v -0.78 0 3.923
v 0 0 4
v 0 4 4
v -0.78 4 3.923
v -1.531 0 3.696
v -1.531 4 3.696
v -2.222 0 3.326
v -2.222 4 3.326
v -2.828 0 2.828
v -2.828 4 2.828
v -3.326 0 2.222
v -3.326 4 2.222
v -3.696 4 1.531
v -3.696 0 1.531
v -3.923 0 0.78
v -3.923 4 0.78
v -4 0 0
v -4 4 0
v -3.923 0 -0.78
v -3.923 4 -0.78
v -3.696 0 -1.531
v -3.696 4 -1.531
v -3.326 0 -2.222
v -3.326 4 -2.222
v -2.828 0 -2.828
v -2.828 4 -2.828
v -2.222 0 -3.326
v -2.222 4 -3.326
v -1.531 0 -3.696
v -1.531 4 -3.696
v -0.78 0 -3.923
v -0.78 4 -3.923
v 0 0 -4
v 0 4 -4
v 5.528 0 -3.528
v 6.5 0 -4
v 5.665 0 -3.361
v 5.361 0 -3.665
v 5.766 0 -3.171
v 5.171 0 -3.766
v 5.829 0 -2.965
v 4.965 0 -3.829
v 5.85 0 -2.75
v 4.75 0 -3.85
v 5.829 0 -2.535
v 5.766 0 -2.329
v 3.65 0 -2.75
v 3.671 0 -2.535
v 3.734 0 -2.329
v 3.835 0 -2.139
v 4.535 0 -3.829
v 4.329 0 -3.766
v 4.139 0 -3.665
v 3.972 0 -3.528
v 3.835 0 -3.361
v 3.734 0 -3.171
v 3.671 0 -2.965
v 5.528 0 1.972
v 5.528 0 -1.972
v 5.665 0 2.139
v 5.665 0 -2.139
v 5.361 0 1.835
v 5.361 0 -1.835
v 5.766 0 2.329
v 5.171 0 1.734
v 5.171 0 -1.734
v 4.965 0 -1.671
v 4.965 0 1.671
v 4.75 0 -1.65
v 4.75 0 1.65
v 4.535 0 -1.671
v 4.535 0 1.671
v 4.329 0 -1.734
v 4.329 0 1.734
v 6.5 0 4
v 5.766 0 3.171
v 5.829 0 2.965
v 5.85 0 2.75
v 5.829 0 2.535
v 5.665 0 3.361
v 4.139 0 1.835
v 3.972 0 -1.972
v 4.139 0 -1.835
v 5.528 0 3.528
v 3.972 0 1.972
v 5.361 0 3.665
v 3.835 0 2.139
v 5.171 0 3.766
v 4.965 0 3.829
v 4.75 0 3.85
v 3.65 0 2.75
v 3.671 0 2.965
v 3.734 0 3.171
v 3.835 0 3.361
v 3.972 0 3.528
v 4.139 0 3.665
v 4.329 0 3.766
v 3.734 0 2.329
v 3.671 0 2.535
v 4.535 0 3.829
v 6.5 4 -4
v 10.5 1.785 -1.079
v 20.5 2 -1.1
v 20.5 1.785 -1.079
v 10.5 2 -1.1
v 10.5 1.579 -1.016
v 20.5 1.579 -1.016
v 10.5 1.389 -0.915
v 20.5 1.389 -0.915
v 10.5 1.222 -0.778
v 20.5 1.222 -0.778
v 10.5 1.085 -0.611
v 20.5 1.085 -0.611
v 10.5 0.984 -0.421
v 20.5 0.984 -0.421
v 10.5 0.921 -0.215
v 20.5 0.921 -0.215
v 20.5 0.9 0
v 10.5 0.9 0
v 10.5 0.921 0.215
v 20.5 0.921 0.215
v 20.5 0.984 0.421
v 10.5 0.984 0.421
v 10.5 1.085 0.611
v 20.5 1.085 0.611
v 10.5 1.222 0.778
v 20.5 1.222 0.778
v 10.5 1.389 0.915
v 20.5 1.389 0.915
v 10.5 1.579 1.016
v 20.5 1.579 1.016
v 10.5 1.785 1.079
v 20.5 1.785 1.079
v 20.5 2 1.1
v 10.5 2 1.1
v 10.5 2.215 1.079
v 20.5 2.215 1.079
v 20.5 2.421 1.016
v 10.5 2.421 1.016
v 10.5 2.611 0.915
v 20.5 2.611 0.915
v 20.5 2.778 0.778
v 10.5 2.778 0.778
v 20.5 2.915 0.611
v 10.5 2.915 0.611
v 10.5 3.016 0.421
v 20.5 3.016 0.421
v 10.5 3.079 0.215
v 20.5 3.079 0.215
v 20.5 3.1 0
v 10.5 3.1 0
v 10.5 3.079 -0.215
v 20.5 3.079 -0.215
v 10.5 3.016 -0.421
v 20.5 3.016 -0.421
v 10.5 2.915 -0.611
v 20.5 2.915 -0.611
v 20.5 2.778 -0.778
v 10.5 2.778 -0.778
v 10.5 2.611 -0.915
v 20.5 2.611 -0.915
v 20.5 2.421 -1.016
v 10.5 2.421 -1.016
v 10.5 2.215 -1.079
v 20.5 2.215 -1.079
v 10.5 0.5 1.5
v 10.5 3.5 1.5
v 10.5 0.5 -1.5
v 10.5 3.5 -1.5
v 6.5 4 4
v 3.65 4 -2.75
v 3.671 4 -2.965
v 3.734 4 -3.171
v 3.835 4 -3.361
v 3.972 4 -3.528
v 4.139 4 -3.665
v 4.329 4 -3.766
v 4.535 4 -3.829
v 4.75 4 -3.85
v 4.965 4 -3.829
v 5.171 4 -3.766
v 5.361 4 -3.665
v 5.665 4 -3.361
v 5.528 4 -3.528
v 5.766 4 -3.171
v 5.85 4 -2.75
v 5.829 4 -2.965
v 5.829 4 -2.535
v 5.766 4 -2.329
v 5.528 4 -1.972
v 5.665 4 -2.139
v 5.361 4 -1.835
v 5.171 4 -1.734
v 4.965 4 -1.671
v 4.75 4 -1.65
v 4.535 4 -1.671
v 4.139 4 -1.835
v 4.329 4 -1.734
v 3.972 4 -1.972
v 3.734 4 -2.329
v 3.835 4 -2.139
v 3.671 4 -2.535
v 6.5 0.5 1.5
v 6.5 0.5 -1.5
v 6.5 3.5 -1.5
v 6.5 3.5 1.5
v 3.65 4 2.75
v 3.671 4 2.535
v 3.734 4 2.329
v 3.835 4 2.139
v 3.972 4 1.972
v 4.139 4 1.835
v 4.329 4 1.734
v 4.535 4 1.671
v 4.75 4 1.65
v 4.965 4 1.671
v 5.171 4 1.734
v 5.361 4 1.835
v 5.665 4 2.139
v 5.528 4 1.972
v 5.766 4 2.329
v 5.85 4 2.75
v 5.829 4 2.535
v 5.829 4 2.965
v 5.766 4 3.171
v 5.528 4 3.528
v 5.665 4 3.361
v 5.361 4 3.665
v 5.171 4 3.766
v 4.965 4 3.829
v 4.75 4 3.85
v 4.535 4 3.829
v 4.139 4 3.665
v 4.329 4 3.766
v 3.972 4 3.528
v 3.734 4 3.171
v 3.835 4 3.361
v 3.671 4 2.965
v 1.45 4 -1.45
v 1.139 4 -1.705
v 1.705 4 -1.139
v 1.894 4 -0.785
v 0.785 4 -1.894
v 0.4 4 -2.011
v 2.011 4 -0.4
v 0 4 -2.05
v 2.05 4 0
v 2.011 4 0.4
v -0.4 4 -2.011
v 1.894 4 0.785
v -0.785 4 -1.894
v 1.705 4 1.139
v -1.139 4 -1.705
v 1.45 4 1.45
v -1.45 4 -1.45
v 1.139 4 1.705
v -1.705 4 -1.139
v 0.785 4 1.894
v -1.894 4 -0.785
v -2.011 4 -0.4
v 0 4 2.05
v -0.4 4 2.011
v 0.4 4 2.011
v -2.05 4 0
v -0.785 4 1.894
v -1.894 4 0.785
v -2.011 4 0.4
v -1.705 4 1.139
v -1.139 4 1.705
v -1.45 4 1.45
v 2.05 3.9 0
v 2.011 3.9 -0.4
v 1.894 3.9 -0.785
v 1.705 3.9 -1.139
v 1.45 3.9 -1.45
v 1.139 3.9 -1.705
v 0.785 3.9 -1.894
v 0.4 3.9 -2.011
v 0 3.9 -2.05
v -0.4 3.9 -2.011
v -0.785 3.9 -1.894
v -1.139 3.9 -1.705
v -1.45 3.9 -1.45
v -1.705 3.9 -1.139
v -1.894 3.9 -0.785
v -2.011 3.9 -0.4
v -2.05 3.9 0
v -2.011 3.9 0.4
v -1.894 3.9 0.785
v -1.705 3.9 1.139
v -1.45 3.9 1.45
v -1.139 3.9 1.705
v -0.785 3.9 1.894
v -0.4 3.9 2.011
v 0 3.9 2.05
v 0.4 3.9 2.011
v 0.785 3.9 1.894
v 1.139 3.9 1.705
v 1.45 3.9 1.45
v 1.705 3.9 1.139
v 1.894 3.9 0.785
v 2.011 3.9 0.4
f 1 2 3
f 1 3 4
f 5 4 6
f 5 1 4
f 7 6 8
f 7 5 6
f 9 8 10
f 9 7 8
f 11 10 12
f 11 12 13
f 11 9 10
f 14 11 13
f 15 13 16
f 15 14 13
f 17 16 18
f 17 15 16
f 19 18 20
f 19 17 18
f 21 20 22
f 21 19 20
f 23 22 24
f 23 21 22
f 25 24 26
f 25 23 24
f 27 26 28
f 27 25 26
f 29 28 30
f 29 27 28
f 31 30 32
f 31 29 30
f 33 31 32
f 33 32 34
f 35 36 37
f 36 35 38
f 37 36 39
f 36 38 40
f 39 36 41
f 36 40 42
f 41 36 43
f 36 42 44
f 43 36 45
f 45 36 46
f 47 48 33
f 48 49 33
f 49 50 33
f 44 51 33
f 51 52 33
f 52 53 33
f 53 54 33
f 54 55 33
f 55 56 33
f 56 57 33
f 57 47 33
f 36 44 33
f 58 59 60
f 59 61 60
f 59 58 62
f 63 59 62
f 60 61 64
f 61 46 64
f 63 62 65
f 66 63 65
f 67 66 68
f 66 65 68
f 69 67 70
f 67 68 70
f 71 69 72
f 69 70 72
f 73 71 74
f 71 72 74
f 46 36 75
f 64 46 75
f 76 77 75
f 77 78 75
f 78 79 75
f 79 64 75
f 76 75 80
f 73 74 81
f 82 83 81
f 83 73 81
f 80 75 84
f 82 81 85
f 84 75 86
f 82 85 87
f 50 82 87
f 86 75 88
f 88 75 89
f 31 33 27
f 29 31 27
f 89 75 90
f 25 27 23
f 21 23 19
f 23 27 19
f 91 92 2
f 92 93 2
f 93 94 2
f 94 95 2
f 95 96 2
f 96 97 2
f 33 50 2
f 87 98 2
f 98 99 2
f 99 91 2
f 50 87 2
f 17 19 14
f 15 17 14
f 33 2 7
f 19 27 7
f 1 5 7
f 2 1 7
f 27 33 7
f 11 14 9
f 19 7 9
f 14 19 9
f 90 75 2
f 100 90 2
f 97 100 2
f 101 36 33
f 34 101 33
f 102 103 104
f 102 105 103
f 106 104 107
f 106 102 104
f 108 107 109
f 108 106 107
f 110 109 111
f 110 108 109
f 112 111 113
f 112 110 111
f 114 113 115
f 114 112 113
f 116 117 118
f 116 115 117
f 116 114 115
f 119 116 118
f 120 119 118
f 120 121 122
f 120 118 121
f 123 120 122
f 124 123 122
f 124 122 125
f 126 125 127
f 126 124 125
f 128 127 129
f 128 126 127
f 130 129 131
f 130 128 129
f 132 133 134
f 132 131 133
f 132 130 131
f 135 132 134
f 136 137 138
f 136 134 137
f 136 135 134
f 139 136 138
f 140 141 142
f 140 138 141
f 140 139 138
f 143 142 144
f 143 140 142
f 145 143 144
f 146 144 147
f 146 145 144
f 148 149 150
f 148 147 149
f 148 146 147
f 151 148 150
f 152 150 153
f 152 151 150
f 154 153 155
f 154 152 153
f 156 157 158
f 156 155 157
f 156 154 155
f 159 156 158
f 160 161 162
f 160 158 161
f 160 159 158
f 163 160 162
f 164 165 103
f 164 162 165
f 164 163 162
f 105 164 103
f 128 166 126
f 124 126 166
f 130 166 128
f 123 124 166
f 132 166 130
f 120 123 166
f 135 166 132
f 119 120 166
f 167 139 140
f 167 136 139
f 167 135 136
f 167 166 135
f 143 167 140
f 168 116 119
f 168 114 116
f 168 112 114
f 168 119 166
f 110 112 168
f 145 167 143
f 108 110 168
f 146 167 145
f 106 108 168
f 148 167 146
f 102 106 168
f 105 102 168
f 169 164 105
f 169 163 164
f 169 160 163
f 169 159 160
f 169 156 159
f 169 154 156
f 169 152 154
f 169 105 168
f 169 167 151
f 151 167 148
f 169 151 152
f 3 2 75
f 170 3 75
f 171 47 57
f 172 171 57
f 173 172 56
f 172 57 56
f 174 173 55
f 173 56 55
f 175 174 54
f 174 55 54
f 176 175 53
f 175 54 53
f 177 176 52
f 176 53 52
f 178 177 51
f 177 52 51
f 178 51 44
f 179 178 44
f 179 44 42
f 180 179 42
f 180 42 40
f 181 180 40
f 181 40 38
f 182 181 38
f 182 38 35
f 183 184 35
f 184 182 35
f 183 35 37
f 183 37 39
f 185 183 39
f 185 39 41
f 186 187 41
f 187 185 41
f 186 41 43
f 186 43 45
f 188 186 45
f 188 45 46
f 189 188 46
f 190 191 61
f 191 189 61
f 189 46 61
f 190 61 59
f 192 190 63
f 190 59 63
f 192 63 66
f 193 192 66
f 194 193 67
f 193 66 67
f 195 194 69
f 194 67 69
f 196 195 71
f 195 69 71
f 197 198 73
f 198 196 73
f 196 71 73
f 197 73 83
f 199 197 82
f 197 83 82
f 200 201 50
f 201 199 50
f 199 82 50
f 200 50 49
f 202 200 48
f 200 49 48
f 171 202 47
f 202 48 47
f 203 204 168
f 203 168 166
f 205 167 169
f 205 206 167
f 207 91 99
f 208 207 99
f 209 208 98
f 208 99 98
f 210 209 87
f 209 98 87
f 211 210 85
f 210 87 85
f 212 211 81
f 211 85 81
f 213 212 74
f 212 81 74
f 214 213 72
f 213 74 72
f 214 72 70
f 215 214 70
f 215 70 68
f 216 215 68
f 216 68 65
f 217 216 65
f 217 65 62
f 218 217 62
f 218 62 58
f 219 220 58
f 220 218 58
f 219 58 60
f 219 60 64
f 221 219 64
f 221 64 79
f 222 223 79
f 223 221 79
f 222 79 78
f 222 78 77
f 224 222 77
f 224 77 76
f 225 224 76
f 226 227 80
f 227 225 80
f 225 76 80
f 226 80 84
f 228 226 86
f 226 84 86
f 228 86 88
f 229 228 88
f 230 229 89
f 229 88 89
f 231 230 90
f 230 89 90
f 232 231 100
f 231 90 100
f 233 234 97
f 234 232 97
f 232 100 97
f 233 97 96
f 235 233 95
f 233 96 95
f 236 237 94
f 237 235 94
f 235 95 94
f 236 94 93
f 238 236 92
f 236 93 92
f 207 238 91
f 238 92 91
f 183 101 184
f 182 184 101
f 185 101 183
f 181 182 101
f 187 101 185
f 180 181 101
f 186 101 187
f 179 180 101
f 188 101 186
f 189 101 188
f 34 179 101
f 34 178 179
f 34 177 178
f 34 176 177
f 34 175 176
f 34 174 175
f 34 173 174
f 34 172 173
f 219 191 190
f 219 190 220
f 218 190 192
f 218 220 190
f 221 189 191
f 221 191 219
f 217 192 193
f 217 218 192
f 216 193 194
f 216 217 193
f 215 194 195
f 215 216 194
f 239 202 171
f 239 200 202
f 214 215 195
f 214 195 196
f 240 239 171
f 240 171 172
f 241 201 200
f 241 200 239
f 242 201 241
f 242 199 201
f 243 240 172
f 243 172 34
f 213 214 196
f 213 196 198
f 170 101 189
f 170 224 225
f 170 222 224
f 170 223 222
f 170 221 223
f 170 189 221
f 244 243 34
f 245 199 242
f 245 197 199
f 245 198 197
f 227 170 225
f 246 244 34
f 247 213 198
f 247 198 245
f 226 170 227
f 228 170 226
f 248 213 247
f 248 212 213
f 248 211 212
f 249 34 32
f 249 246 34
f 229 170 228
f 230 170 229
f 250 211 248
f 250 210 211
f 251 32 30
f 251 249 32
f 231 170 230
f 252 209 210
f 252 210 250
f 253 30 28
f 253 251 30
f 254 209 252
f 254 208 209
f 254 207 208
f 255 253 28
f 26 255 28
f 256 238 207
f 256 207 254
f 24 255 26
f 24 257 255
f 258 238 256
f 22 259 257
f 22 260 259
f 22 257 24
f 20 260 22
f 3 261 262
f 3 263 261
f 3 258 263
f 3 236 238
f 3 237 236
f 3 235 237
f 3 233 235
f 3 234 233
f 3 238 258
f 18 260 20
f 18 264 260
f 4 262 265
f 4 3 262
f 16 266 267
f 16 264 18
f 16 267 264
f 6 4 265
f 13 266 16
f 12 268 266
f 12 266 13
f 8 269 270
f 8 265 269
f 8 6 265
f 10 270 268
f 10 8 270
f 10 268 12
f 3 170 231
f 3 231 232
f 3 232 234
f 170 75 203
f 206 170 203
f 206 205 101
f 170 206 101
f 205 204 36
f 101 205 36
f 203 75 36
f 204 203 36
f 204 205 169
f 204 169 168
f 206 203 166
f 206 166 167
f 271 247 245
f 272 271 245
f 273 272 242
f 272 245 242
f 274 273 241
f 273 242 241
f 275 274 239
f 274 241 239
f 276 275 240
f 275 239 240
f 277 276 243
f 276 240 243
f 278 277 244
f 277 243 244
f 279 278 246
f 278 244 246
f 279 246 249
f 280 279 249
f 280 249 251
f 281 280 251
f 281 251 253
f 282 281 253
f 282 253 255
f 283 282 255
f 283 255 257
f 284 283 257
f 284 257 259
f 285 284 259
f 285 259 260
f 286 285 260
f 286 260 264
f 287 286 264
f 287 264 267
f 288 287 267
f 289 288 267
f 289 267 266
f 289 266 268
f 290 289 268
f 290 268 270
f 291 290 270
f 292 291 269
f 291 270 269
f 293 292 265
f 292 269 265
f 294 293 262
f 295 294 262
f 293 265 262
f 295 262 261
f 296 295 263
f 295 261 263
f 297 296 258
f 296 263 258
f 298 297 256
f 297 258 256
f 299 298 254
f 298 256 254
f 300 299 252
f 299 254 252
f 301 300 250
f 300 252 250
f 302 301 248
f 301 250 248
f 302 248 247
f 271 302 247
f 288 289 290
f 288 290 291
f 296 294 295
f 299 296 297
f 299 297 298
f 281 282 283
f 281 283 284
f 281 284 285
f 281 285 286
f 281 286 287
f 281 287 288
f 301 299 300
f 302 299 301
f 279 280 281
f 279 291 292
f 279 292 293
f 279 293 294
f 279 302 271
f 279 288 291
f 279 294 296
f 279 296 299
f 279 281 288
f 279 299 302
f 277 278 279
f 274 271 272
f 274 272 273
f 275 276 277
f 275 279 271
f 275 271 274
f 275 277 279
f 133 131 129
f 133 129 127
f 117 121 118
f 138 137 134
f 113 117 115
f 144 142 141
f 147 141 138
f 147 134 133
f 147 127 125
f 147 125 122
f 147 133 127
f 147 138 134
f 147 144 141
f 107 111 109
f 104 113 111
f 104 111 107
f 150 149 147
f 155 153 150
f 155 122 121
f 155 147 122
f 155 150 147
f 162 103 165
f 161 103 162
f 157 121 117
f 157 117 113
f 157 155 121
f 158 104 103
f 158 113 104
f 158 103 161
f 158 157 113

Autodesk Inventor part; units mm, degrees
ref_plane "YZ Plane" through (0, 0, 0) normal (1, 0, 0) x (0, 1, 0)
ref_plane "XZ Plane" through (0, 0, 0) normal (0, 1, 0) x (-1, 0, 0)
ref_plane "XY Plane" through (0, 0, 0) normal (0, 0, 1) x (1, 0, 0)
sketch "Sketch1" plane through (0, 0, 0) normal (0, 1, 0) x (-1, 0, 0)
  circle A0 centre (0, 0) radius 4
  line L0 (0, 4) -> (-6.5, 4)
  line L1 (-6.5, 4) -> (-6.5, -4)
  line L2 (-6.5, -4) -> (0, -4)
  line L3 (0, -4) -> (0, 4)
  circle A1 centre (-4.75, 2.75) radius 1.1
  circle A2 centre (-4.75, -2.75) radius 1.1
  point P0 (-6.5, 0)
  dimension "d0" = 8
  dimension "d1" = 6.5
  dimension "d2" = 5.5
  dimension "d3" = 2.75
  dimension "d4" = 1.75
  dimension "d5" = 1.75
  dimension "d6" = 2.2
  dimension "d7" = 2.2
extrude "Extrusion1" add sketch "Sketch1" along normal blind 4
sketch "Sketch2" plane through (6.5, 0, 4) normal (1, 0, 0) x (0, 0, -1)
  line L0 (2.5, 3.5) -> (5.5, 3.5)
  line L1 (5.5, 3.5) -> (5.5, 0.5)
  line L2 (5.5, 0.5) -> (2.5, 0.5)
  line L3 (2.5, 0.5) -> (2.5, 3.5)
  line L4 (0, 4) -> (8, 4) projected
  line L5 (8, 0) -> (8, 4) projected
  point P0 (4, 0)
  dimension "d10" = 3
  dimension "d11" = 3
  dimension "d12" = 0.5
  dimension "d13" = 5.5
extrude "Extrusion2" add sketch "Sketch2" along normal blind 4
sketch "Sketch3" plane through (0, 4, 0) normal (0, 1, 0) x (1, 0, 0)
  circle A0 centre (0, 0) radius 2.05
  dimension "d16" = 4.1
extrude "Extrusion3" cut sketch "Sketch3" against normal blind 0.1
sketch "Sketch4" plane through (10.5, 0, 4) normal (1, 0, 0) x (0, 0, -1)
  circle A0 centre (4, 2) radius 1.1
  point P0 (4, 0)
  dimension "d19" = 2.2
extrude "Extrusion4" add sketch "Sketch4" along normal blind 10
equation "\"d3\" = 0.5 * d2"
equation "\"d5\" = d4"
equation "\"d6\" = d7"
properties part number "CapacitiveSensor"
